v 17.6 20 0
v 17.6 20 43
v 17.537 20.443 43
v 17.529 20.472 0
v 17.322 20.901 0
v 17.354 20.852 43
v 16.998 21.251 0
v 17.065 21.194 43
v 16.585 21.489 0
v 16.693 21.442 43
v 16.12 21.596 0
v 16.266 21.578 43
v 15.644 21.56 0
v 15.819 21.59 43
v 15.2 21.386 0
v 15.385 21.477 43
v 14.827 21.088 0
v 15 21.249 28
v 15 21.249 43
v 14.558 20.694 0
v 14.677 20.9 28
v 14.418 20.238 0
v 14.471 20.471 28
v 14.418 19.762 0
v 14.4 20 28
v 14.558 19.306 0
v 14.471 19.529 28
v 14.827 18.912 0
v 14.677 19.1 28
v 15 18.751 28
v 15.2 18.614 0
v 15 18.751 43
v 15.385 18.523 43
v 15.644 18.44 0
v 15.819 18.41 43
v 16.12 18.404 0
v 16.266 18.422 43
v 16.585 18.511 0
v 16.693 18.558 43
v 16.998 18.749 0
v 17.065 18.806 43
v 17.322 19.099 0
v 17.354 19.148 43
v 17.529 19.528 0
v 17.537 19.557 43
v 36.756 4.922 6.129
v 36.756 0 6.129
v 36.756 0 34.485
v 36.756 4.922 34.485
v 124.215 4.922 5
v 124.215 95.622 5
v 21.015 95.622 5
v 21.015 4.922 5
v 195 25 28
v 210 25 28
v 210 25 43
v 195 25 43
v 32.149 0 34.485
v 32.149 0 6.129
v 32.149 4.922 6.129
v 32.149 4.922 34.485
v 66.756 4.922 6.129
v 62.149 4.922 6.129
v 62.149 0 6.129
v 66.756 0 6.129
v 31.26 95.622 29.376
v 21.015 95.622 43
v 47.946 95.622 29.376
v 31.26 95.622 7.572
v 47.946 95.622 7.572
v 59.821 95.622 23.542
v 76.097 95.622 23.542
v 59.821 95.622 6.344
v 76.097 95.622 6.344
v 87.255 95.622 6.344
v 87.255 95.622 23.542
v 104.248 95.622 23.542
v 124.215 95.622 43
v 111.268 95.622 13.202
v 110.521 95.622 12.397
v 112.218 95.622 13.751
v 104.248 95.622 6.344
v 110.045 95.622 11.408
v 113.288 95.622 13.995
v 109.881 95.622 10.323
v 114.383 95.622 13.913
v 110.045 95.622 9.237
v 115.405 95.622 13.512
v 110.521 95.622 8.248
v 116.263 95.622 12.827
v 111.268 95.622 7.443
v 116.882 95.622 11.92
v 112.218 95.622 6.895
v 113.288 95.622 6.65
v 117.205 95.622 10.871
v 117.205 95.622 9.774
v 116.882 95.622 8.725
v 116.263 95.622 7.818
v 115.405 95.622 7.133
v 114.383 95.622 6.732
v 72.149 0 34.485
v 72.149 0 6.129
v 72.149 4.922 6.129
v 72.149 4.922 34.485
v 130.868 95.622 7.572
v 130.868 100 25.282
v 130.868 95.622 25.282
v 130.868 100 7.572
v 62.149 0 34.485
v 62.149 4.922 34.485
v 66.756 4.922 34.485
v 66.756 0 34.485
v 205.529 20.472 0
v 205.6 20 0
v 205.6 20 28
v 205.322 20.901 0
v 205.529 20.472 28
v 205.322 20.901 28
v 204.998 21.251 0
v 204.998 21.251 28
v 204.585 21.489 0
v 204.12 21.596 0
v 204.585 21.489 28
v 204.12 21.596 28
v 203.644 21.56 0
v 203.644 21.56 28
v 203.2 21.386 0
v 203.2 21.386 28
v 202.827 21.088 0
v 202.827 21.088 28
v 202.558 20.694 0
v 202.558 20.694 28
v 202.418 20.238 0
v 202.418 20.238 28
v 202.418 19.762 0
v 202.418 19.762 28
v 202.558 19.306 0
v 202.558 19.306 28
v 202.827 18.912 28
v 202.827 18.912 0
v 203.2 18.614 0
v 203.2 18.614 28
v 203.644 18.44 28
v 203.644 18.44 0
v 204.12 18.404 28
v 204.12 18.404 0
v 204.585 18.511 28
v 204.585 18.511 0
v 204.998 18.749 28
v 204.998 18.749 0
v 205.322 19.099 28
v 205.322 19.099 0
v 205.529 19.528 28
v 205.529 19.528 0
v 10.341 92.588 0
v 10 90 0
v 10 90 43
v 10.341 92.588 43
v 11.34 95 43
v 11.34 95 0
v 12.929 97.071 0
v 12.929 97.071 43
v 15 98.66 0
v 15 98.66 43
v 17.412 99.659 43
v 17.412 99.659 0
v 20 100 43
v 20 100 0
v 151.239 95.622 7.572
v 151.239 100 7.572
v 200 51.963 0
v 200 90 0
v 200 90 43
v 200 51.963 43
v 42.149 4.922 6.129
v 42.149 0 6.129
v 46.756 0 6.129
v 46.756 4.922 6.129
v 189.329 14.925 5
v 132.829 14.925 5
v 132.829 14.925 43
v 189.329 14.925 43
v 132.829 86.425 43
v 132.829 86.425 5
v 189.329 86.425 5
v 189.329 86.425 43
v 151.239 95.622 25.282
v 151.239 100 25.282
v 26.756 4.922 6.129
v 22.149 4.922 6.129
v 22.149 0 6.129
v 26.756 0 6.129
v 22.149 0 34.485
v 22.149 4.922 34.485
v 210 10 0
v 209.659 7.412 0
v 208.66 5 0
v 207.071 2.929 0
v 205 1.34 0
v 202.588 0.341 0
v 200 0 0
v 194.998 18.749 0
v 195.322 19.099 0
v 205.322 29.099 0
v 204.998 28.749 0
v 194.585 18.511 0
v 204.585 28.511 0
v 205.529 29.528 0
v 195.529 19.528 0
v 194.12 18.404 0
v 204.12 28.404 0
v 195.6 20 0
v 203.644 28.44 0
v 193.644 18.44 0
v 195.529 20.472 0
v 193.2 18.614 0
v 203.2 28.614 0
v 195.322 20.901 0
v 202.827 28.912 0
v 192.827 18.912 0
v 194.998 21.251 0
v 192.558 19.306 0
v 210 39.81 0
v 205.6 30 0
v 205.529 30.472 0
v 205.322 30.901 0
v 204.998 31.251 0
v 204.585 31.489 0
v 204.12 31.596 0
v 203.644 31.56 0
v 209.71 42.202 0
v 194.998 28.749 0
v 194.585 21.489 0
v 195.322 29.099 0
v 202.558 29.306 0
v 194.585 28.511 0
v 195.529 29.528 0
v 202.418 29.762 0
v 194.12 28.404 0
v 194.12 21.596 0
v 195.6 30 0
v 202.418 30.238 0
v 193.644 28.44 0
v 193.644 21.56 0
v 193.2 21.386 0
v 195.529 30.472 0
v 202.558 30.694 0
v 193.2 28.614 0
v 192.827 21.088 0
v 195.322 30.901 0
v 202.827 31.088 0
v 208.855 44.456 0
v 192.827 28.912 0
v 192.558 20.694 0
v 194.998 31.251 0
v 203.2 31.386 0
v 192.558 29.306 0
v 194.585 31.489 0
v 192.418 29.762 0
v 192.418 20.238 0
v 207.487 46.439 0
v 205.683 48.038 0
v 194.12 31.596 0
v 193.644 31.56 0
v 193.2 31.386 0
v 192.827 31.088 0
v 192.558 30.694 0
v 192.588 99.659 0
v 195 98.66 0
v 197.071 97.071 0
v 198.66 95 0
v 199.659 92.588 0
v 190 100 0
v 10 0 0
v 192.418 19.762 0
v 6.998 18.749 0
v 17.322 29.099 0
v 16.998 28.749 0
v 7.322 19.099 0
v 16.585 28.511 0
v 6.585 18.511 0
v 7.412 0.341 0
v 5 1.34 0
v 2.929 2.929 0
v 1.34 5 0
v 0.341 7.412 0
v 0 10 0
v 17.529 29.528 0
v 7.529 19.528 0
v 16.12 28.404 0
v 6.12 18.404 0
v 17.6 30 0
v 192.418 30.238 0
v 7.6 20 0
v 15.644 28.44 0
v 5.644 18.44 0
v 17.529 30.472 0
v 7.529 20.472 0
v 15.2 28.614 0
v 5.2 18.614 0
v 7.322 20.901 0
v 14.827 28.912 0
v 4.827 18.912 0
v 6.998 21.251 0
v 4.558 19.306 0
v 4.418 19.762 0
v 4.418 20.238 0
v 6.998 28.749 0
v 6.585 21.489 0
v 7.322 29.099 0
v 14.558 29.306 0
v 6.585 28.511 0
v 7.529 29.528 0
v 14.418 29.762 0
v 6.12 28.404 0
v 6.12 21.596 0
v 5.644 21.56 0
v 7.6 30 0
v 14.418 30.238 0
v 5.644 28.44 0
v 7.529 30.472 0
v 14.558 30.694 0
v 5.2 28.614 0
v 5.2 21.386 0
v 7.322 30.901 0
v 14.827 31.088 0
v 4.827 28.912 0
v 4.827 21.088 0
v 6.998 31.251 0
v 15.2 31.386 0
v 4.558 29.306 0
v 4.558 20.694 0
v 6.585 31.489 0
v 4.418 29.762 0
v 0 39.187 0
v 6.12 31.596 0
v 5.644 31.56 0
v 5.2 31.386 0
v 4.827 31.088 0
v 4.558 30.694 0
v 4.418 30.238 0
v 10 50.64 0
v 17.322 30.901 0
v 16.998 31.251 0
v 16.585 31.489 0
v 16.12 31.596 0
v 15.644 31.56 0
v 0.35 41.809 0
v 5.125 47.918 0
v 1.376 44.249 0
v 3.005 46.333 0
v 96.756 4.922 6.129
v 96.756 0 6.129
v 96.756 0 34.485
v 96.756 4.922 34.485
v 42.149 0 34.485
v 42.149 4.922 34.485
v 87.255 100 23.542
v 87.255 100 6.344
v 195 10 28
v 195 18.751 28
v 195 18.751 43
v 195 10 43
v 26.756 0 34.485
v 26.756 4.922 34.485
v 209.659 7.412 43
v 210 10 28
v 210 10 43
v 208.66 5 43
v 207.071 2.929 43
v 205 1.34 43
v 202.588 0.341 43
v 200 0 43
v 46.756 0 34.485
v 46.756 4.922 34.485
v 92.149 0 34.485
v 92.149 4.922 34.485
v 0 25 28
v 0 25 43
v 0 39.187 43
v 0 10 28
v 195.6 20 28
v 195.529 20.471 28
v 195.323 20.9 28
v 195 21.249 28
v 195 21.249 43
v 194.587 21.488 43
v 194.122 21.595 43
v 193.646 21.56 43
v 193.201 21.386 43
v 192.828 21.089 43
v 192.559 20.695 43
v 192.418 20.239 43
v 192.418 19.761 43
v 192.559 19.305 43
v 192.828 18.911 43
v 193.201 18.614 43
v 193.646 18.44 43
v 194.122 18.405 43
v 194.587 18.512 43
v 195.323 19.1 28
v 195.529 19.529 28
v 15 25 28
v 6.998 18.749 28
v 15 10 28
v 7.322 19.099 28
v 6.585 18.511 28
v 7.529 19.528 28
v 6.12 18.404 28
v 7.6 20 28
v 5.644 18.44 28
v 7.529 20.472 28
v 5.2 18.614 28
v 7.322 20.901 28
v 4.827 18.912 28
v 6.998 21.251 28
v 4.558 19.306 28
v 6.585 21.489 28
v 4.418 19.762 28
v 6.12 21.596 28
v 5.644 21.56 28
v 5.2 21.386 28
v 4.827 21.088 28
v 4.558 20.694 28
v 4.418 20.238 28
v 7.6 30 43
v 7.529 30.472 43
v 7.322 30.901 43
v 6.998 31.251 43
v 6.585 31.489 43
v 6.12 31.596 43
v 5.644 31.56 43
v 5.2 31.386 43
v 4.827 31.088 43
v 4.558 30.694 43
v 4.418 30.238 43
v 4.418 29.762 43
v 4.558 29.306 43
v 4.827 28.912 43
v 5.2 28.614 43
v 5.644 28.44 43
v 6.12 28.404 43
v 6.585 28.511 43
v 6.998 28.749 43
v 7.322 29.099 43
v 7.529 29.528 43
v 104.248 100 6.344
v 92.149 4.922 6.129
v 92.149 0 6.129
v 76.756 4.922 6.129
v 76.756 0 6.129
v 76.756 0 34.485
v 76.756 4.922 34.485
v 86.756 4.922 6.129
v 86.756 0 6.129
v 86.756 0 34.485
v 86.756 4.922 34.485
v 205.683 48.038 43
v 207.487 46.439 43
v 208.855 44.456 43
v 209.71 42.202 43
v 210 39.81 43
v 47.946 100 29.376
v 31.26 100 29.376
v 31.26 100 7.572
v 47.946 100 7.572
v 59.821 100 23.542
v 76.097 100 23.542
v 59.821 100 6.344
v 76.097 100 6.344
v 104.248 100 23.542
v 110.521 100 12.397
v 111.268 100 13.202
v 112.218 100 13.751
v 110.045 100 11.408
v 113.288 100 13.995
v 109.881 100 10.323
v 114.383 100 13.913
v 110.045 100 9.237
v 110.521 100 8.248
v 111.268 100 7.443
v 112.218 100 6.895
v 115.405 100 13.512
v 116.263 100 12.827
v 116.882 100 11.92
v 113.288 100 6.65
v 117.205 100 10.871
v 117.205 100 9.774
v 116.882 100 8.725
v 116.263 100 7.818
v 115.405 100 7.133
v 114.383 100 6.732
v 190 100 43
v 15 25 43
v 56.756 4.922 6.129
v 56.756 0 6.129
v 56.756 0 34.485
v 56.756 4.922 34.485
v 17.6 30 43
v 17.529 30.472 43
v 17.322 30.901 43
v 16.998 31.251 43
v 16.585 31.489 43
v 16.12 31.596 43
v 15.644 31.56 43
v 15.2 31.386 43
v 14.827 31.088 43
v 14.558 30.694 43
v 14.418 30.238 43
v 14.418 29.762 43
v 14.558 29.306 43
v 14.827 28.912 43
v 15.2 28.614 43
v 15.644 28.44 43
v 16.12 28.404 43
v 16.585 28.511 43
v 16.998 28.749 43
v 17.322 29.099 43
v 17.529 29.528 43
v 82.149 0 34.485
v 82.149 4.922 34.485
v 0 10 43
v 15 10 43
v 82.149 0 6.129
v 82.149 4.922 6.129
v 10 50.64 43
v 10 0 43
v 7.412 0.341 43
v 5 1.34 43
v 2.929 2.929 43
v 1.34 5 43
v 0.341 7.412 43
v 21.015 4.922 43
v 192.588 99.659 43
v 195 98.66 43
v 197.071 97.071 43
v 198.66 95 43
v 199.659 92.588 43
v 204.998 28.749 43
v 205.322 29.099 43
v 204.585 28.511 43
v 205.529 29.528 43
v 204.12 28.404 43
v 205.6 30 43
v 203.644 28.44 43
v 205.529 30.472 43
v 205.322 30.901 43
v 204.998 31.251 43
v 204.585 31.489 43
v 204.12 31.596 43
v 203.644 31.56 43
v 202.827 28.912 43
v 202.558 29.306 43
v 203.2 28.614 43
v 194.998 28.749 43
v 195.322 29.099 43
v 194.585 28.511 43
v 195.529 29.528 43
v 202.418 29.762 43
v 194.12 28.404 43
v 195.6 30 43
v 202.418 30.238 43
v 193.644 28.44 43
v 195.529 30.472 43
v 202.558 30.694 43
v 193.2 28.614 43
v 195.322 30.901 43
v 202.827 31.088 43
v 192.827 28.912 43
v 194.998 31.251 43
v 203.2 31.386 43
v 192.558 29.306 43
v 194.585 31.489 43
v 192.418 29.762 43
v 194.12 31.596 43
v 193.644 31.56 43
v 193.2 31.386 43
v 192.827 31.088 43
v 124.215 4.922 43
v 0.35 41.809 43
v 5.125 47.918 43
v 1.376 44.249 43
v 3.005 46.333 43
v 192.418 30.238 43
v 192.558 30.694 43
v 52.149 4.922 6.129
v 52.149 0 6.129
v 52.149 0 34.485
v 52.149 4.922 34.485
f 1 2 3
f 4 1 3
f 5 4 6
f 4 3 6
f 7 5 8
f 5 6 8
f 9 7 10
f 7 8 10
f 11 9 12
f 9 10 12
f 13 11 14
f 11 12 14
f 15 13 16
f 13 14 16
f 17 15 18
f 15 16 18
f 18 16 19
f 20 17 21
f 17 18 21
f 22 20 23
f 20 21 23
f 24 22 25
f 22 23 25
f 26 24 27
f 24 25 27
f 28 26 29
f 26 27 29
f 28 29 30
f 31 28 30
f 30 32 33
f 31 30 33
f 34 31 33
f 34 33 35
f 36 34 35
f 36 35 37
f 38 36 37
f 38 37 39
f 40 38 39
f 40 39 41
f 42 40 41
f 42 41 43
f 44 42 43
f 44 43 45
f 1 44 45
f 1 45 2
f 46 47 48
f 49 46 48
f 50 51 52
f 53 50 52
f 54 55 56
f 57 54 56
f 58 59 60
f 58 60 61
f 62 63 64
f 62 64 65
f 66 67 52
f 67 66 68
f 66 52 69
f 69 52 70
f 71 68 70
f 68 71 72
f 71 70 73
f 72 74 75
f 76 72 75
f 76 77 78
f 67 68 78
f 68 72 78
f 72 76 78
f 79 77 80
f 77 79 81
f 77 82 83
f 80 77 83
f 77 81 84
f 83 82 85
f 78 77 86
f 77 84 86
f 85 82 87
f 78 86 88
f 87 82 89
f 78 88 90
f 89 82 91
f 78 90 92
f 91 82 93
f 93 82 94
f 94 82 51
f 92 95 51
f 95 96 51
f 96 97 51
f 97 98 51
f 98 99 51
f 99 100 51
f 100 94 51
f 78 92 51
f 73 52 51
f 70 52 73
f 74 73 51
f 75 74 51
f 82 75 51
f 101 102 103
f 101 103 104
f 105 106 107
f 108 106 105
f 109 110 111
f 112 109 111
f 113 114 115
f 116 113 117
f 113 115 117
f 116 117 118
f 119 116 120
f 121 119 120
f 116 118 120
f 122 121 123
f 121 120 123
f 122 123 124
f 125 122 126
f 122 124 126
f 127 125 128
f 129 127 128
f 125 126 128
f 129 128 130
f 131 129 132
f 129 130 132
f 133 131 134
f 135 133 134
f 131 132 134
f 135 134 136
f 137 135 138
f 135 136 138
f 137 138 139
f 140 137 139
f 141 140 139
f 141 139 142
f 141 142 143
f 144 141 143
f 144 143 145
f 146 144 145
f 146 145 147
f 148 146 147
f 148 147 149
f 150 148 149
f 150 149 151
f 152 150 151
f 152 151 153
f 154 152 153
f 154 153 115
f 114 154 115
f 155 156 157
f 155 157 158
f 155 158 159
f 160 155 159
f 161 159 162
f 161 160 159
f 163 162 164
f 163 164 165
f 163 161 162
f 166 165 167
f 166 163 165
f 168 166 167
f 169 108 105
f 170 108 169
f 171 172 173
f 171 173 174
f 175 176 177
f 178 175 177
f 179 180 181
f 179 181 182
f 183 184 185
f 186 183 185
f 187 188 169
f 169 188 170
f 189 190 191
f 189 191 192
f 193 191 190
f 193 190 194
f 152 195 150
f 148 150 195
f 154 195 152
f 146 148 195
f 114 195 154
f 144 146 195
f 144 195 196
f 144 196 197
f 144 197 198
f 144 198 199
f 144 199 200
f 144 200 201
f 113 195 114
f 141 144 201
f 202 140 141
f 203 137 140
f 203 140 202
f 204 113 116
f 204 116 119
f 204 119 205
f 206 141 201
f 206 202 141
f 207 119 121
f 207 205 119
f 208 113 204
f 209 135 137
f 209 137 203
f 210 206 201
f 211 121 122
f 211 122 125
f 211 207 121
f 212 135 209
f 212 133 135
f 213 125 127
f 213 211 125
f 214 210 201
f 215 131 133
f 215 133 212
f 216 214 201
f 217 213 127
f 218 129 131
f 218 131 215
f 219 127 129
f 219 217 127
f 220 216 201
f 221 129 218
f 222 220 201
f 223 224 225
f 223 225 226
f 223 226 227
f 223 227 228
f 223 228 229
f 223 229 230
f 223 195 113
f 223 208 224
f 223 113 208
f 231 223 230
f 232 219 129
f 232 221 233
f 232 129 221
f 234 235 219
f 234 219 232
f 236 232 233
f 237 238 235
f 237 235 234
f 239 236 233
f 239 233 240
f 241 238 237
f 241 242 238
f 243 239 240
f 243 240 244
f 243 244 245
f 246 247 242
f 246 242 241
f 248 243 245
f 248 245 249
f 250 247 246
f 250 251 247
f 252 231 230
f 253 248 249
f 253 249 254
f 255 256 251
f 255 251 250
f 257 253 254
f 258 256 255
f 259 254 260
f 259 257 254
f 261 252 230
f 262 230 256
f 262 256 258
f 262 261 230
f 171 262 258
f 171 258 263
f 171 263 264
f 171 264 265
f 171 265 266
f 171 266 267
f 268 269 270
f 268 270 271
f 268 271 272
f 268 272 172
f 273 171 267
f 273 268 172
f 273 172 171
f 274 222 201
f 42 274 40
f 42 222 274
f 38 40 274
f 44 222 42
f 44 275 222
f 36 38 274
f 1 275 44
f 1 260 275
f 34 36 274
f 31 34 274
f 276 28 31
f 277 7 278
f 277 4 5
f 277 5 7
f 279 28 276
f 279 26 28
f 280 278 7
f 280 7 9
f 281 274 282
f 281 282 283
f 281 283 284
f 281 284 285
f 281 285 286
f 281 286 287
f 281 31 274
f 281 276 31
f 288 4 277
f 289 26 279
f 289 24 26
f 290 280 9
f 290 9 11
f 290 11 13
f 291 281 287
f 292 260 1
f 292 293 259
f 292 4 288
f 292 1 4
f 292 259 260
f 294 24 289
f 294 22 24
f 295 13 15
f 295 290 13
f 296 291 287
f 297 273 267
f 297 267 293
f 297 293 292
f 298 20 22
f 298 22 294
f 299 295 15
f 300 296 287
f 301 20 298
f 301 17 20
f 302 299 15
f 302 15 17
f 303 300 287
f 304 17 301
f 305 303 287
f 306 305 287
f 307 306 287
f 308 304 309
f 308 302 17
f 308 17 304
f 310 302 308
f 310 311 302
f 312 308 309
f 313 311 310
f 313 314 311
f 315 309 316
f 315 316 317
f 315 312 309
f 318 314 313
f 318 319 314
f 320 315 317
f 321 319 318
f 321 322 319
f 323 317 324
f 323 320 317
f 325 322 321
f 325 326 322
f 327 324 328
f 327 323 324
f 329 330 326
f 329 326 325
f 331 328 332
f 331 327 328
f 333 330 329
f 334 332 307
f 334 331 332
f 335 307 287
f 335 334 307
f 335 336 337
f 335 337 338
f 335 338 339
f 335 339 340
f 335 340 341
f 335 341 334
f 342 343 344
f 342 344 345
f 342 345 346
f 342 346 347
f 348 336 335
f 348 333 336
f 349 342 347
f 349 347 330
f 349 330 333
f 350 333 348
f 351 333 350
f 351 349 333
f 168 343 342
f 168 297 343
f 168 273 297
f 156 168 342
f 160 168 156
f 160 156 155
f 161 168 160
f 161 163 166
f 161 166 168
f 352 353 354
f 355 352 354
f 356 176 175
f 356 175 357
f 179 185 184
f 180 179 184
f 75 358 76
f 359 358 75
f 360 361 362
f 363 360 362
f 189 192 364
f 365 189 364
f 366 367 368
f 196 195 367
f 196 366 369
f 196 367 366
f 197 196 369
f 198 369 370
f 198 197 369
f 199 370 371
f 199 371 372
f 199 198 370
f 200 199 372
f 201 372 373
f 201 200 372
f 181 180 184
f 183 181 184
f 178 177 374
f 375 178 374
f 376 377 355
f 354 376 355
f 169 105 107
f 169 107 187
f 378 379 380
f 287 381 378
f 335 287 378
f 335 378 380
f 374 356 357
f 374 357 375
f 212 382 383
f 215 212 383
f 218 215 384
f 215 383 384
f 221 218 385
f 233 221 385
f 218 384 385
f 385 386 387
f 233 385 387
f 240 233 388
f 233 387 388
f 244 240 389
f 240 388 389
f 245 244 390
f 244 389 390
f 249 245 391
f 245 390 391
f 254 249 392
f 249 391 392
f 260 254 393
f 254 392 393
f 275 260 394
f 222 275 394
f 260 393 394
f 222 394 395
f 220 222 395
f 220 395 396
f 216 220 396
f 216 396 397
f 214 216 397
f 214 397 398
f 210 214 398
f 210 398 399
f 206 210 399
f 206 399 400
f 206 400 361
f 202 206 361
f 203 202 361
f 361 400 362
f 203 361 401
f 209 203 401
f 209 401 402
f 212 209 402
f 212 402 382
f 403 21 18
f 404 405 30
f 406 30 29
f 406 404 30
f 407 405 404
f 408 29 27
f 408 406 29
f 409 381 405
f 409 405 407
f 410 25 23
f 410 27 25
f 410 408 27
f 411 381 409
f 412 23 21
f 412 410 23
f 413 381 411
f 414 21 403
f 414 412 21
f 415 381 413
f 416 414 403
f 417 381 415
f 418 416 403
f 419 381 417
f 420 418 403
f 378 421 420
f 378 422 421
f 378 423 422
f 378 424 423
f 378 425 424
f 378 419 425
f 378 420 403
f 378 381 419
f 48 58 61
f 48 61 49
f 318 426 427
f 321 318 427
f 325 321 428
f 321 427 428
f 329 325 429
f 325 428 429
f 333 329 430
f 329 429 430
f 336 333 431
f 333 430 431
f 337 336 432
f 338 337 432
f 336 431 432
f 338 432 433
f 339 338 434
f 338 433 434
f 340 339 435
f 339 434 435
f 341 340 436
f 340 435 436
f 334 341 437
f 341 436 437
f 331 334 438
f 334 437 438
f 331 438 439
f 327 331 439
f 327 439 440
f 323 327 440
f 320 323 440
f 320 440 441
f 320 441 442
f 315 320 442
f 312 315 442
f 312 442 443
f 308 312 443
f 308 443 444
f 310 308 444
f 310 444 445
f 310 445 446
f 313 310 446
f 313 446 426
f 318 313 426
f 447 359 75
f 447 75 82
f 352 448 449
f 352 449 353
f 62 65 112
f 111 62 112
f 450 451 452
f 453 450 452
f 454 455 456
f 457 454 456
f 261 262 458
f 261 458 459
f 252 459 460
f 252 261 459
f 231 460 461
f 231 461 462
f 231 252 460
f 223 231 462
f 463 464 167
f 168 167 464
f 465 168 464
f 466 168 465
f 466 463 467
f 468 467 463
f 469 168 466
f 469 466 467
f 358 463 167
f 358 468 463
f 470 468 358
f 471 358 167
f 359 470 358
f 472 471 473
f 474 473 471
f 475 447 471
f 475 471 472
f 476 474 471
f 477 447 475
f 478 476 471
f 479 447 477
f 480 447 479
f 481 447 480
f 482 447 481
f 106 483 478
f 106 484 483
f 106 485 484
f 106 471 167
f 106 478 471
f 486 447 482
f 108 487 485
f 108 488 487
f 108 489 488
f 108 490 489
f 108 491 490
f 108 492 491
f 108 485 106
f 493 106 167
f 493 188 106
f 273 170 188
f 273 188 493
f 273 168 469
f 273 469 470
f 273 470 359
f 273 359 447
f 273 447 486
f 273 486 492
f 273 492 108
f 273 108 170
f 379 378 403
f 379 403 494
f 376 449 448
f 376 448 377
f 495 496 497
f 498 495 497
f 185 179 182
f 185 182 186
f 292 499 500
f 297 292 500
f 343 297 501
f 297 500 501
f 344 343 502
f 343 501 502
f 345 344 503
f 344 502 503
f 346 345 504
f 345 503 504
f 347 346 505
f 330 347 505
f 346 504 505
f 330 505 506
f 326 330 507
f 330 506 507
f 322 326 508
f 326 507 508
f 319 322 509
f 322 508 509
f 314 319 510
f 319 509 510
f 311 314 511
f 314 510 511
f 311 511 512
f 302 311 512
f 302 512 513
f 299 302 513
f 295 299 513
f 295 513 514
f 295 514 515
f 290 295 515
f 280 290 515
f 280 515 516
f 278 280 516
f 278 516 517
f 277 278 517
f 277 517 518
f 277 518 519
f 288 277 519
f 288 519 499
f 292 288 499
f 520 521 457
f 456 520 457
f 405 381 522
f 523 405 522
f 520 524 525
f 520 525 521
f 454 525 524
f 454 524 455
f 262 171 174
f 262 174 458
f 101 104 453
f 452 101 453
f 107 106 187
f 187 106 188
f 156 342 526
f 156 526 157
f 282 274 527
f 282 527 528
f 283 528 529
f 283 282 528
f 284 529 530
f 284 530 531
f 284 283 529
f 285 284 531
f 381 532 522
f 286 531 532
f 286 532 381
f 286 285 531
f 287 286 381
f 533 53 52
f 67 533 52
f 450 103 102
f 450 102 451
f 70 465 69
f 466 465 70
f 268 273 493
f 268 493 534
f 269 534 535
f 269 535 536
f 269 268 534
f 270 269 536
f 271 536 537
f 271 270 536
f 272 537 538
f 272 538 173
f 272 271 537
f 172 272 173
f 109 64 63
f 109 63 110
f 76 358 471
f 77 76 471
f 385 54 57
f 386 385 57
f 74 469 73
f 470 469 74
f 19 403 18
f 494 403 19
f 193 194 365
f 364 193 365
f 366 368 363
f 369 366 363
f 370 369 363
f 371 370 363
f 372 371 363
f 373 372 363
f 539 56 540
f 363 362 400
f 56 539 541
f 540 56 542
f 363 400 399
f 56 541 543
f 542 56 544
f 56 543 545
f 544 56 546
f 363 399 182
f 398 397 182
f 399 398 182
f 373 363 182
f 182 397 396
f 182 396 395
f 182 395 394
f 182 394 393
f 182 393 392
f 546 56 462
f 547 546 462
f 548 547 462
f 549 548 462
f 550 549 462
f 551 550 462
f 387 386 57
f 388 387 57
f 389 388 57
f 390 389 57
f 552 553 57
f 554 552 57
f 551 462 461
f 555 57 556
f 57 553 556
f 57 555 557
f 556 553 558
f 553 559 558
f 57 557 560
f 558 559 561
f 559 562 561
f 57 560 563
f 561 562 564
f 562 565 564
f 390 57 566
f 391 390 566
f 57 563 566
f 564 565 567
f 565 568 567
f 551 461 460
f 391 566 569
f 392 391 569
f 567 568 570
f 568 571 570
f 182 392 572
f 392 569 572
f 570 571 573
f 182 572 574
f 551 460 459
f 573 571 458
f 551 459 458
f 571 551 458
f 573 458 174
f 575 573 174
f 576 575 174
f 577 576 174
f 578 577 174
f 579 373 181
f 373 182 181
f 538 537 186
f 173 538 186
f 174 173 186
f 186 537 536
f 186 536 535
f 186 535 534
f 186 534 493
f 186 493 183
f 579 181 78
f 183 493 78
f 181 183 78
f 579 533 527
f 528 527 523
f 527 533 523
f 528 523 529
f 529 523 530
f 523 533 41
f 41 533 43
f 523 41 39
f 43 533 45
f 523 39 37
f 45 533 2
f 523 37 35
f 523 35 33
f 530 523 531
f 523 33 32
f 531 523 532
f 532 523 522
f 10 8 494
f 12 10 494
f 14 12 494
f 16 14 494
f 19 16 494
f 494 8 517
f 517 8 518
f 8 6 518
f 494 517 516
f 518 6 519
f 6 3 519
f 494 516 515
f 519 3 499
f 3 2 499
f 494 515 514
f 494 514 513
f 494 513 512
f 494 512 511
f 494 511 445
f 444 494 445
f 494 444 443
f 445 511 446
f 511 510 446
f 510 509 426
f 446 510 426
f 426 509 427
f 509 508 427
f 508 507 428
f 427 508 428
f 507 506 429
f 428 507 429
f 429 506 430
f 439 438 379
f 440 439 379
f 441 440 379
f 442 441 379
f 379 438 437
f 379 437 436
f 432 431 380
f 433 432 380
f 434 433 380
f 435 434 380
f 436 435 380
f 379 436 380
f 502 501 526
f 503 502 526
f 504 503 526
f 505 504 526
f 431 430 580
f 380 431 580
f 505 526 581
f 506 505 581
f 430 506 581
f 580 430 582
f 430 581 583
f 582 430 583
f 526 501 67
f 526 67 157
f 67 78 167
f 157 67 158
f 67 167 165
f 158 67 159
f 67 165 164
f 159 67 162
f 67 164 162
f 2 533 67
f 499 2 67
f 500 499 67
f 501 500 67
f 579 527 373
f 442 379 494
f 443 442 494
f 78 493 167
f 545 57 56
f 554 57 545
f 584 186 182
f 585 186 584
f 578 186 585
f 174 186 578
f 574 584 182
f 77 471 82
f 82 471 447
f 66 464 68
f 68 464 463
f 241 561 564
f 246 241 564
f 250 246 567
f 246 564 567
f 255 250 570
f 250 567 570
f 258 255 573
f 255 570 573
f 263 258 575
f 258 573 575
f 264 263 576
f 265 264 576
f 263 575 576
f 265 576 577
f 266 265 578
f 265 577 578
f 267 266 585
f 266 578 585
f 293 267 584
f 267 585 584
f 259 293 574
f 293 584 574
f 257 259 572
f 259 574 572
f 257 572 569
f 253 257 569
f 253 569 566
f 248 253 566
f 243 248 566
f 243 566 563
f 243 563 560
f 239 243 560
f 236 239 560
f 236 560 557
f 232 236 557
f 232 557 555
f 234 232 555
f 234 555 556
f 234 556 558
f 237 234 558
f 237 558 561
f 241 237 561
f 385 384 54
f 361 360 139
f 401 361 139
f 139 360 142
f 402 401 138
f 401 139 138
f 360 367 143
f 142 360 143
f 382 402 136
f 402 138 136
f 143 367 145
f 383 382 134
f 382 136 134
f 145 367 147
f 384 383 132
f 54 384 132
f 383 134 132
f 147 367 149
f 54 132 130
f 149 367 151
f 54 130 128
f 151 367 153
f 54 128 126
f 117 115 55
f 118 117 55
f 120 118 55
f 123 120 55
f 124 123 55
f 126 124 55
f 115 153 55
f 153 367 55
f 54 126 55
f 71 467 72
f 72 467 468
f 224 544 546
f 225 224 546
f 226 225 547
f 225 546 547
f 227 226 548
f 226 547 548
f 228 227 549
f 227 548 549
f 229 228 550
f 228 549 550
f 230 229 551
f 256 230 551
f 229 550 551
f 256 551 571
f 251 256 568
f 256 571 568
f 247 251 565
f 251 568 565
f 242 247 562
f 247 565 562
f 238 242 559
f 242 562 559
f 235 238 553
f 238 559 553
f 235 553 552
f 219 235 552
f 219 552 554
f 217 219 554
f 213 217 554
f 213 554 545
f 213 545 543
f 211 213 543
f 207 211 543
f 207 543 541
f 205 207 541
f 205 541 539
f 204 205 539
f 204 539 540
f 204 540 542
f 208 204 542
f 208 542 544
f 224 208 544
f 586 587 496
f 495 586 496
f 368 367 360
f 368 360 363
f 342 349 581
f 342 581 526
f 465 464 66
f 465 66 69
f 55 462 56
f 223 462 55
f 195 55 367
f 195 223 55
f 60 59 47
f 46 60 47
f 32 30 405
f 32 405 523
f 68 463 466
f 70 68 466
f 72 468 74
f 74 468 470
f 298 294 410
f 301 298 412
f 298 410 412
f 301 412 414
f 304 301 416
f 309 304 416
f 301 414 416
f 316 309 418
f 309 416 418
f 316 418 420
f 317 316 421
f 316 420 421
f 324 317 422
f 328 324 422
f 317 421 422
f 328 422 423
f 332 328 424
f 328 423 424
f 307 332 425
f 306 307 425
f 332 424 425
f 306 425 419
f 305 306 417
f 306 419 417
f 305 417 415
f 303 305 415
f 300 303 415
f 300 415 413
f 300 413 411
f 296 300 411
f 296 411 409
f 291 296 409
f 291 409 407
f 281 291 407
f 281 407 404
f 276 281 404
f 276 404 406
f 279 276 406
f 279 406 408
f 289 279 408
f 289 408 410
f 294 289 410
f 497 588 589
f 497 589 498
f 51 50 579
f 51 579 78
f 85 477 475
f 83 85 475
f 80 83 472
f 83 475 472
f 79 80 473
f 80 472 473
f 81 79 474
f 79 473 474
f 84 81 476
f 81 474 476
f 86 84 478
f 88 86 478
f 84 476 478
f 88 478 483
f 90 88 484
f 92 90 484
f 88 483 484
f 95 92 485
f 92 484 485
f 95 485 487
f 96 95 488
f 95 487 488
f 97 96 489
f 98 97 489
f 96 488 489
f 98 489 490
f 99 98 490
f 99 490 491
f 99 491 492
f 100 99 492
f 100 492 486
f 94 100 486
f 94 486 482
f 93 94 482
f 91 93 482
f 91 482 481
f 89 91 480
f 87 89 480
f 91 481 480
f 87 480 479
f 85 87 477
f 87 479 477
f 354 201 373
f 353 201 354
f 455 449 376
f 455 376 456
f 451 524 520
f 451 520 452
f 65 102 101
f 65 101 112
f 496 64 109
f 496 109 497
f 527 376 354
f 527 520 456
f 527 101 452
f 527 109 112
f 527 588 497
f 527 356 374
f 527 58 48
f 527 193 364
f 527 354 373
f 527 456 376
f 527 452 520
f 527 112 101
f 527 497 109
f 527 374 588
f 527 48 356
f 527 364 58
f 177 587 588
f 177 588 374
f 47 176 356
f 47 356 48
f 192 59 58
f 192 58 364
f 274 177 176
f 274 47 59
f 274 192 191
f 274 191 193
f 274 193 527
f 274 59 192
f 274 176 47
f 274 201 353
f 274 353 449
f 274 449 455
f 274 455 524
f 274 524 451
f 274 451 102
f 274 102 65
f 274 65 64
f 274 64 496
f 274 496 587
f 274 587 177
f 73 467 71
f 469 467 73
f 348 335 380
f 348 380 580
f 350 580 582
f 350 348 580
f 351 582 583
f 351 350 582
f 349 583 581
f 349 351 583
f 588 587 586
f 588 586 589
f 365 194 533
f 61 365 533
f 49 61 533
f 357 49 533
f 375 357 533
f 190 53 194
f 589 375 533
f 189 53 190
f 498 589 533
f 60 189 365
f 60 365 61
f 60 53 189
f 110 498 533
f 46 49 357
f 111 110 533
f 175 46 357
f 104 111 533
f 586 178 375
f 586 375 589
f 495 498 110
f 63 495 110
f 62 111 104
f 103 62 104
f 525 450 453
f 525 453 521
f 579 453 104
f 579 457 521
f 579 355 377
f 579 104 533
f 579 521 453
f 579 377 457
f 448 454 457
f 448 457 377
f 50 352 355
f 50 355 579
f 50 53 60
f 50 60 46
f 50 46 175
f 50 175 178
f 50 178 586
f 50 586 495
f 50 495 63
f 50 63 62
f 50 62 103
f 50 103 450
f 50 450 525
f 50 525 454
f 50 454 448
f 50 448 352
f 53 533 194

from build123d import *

# Parameters (mm, degrees)
SKETCH_1_W          = 103.2
SKETCH_1_H          = 90.7
SKETCH_1_W_2        = 56.5
SKETCH_1_H_2        = 71.5
EXTRUDE_1_DEPTH     = 43
EXTRUDE_3_DEPTH     = 5
SKETCH_4_R          = 3.682623049
SKETCH_4_W          = 20.371137154
SKETCH_4_H          = 17.709581546
SKETCH_4_W_2        = 16.685906313
SKETCH_4_H_2        = 21.804282482
SKETCH_4_W_3        = 16.276436219
SKETCH_4_H_3        = 17.19774393
SKETCH_4_W_4        = 16.993008883
CUT_EXTRUDE_2_DEPTH = 4.377522815
SKETCH_5_W          = 4.606538552
SKETCH_5_H          = 28.355803979
CUT_EXTRUDE_3_DEPTH = 4.922477185
SKETCH_7_R          = 1.6
CUT_EXTRUDE_4_DEPTH = 237.535409611
SKETCH_8_W          = 15
SKETCH_8_H          = 15
CUT_EXTRUDE_5_DEPTH = 15


with BuildPart() as part:
    # 草图1 → 凸台-拉伸1 (new body)
    with BuildSketch(Plane.XY):
        with BuildLine():
            Line((0, 10), (0, 39.186569494))
            ThreePointArc((0, 39.186569494), (1.375838219, 44.248568464), (5.124766715, 47.917669105))
            Line((5.124766715, 47.917669105), (10, 50.639880584))
            Line((10, 50.639880584), (10, 90))
            ThreePointArc((10, 90), (12.928932188, 97.071067812), (20, 100))
            Line((20, 100), (190, 100))
            ThreePointArc((190, 100), (197.071067812, 97.071067812), (200, 90))
            Line((200, 90), (200, 51.963395008))
            Line((200, 51.963395008), (205.683304945, 48.037782396))
            ThreePointArc((205.683304945, 48.037782396), (208.855310538, 44.455580593), (210, 39.809778695))
            Line((210, 39.809778695), (210, 10))
            ThreePointArc((210, 10), (207.071067812, 2.928932188), (200, 0))
            Line((200, 0), (10, 0))
            ThreePointArc((10, 0), (2.928932188, 2.928932188), (0, 10))
        make_face()
        with Locations((72.614593403, 50.272477185)):
            Rectangle(SKETCH_1_W, SKETCH_1_H, mode=Mode.SUBTRACT)
        with Locations((161.079111209, 50.675353005)):
            Rectangle(SKETCH_1_W_2, SKETCH_1_H_2, mode=Mode.SUBTRACT)
    extrude(amount=EXTRUDE_1_DEPTH)

    # 草图3 → 凸台-拉伸3 (add)
    with BuildSketch(Plane.XY):
        with BuildLine():
            Line((0, 10), (0, 39.186569494))
            ThreePointArc((0, 39.186569494), (1.375838219, 44.248568464), (5.124766715, 47.917669105))
            Line((5.124766715, 47.917669105), (10, 50.639880584))
            Line((10, 50.639880584), (10, 90))
            ThreePointArc((10, 90), (12.928932188, 97.071067812), (20, 100))
            Line((20, 100), (180, 100))
            ThreePointArc((180, 100), (187.071067812, 97.071067812), (190, 90))
            Line((190, 90), (190, 51.963395008))
            Line((190, 51.963395008), (195.683304945, 48.037782396))
            ThreePointArc((195.683304945, 48.037782396), (198.855310538, 44.455580593), (200, 39.809778695))
            Line((200, 39.809778695), (200, 10))
            ThreePointArc((200, 10), (197.071067812, 2.928932188), (190, 0))
            Line((190, 0), (10, 0))
            ThreePointArc((10, 0), (2.928932188, 2.928932188), (0, 10))
        make_face()
    extrude(amount=EXTRUDE_3_DEPTH)

    # 草图4 → 切除-拉伸2 (cut)
    with BuildSketch(Plane(origin=(0, 100, 0), x_dir=(1, 0, 0), z_dir=(0, 1, 0))):
        with Locations(Location((113.563696849, -10.32262821, 0), (0, 0, 180))):
            Circle(SKETCH_4_R)
        with Locations((141.053854619, -16.426982565)):
            Rectangle(SKETCH_4_W, SKETCH_4_H)
        with Locations((39.603161201, -18.474333033)):
            Rectangle(SKETCH_4_W_2, SKETCH_4_H_2)
        with Locations((67.958965179, -14.942653476)):
            Rectangle(SKETCH_4_W_3, SKETCH_4_H_3)
        with Locations((95.751747779, -14.942653476)):
            Rectangle(SKETCH_4_W_4, SKETCH_4_H_3)
    extrude(amount=-CUT_EXTRUDE_2_DEPTH, mode=Mode.SUBTRACT)

    # 草图5 → 切除-拉伸3 (cut)
    with BuildSketch(Plane.XZ):
        with Locations((34.452767739, 20.30710257)):
            Rectangle(SKETCH_5_W, SKETCH_5_H)
        with Locations((24.452767739, 20.30710257)):
            Rectangle(SKETCH_5_W, SKETCH_5_H)
        with Locations((44.452767739, 20.30710257)):
            Rectangle(SKETCH_5_W, SKETCH_5_H)
        with Locations((54.452767739, 20.30710257)):
            Rectangle(SKETCH_5_W, SKETCH_5_H)
        with Locations((64.452767739, 20.30710257)):
            Rectangle(SKETCH_5_W, SKETCH_5_H)
        with Locations((74.452767739, 20.30710257)):
            Rectangle(SKETCH_5_W, SKETCH_5_H)
        with Locations((84.452767739, 20.30710257)):
            Rectangle(SKETCH_5_W, SKETCH_5_H)
        with Locations((94.452767739, 20.30710257)):
            Rectangle(SKETCH_5_W, SKETCH_5_H)
    extrude(amount=-CUT_EXTRUDE_3_DEPTH, mode=Mode.SUBTRACT)

    # 草图7 → 切除-拉伸4 (cut, through all)
    with BuildSketch(Plane.XY.offset(43)):
        with Locations((6, 30)):
            Circle(SKETCH_7_R)
        with Locations((16, 30)):
            Circle(SKETCH_7_R)
        with Locations((16, 20)):
            Circle(SKETCH_7_R)
        with Locations((6, 20)):
            Circle(SKETCH_7_R)
        with Locations((194, 30)):
            Circle(SKETCH_7_R)
        with Locations((204, 30)):
            Circle(SKETCH_7_R)
        with Locations((204, 20)):
            Circle(SKETCH_7_R)
        with Locations((194, 20)):
            Circle(SKETCH_7_R)
    extrude(amount=-CUT_EXTRUDE_4_DEPTH, mode=Mode.SUBTRACT)

    # 草图8 → 切除-拉伸5 (cut)
    with BuildSketch(Plane.ZY):
        with Locations((35.5, 17.5)):
            Rectangle(SKETCH_8_W, SKETCH_8_H)
    cut_extrude_5 = extrude(amount=-CUT_EXTRUDE_5_DEPTH, mode=Mode.SUBTRACT)

    # 镜向1: 切除-拉伸5 across plane
    add(cut_extrude_5.mirror(Plane.ZY.offset(-105)), mode=Mode.SUBTRACT)


solid = part.part
